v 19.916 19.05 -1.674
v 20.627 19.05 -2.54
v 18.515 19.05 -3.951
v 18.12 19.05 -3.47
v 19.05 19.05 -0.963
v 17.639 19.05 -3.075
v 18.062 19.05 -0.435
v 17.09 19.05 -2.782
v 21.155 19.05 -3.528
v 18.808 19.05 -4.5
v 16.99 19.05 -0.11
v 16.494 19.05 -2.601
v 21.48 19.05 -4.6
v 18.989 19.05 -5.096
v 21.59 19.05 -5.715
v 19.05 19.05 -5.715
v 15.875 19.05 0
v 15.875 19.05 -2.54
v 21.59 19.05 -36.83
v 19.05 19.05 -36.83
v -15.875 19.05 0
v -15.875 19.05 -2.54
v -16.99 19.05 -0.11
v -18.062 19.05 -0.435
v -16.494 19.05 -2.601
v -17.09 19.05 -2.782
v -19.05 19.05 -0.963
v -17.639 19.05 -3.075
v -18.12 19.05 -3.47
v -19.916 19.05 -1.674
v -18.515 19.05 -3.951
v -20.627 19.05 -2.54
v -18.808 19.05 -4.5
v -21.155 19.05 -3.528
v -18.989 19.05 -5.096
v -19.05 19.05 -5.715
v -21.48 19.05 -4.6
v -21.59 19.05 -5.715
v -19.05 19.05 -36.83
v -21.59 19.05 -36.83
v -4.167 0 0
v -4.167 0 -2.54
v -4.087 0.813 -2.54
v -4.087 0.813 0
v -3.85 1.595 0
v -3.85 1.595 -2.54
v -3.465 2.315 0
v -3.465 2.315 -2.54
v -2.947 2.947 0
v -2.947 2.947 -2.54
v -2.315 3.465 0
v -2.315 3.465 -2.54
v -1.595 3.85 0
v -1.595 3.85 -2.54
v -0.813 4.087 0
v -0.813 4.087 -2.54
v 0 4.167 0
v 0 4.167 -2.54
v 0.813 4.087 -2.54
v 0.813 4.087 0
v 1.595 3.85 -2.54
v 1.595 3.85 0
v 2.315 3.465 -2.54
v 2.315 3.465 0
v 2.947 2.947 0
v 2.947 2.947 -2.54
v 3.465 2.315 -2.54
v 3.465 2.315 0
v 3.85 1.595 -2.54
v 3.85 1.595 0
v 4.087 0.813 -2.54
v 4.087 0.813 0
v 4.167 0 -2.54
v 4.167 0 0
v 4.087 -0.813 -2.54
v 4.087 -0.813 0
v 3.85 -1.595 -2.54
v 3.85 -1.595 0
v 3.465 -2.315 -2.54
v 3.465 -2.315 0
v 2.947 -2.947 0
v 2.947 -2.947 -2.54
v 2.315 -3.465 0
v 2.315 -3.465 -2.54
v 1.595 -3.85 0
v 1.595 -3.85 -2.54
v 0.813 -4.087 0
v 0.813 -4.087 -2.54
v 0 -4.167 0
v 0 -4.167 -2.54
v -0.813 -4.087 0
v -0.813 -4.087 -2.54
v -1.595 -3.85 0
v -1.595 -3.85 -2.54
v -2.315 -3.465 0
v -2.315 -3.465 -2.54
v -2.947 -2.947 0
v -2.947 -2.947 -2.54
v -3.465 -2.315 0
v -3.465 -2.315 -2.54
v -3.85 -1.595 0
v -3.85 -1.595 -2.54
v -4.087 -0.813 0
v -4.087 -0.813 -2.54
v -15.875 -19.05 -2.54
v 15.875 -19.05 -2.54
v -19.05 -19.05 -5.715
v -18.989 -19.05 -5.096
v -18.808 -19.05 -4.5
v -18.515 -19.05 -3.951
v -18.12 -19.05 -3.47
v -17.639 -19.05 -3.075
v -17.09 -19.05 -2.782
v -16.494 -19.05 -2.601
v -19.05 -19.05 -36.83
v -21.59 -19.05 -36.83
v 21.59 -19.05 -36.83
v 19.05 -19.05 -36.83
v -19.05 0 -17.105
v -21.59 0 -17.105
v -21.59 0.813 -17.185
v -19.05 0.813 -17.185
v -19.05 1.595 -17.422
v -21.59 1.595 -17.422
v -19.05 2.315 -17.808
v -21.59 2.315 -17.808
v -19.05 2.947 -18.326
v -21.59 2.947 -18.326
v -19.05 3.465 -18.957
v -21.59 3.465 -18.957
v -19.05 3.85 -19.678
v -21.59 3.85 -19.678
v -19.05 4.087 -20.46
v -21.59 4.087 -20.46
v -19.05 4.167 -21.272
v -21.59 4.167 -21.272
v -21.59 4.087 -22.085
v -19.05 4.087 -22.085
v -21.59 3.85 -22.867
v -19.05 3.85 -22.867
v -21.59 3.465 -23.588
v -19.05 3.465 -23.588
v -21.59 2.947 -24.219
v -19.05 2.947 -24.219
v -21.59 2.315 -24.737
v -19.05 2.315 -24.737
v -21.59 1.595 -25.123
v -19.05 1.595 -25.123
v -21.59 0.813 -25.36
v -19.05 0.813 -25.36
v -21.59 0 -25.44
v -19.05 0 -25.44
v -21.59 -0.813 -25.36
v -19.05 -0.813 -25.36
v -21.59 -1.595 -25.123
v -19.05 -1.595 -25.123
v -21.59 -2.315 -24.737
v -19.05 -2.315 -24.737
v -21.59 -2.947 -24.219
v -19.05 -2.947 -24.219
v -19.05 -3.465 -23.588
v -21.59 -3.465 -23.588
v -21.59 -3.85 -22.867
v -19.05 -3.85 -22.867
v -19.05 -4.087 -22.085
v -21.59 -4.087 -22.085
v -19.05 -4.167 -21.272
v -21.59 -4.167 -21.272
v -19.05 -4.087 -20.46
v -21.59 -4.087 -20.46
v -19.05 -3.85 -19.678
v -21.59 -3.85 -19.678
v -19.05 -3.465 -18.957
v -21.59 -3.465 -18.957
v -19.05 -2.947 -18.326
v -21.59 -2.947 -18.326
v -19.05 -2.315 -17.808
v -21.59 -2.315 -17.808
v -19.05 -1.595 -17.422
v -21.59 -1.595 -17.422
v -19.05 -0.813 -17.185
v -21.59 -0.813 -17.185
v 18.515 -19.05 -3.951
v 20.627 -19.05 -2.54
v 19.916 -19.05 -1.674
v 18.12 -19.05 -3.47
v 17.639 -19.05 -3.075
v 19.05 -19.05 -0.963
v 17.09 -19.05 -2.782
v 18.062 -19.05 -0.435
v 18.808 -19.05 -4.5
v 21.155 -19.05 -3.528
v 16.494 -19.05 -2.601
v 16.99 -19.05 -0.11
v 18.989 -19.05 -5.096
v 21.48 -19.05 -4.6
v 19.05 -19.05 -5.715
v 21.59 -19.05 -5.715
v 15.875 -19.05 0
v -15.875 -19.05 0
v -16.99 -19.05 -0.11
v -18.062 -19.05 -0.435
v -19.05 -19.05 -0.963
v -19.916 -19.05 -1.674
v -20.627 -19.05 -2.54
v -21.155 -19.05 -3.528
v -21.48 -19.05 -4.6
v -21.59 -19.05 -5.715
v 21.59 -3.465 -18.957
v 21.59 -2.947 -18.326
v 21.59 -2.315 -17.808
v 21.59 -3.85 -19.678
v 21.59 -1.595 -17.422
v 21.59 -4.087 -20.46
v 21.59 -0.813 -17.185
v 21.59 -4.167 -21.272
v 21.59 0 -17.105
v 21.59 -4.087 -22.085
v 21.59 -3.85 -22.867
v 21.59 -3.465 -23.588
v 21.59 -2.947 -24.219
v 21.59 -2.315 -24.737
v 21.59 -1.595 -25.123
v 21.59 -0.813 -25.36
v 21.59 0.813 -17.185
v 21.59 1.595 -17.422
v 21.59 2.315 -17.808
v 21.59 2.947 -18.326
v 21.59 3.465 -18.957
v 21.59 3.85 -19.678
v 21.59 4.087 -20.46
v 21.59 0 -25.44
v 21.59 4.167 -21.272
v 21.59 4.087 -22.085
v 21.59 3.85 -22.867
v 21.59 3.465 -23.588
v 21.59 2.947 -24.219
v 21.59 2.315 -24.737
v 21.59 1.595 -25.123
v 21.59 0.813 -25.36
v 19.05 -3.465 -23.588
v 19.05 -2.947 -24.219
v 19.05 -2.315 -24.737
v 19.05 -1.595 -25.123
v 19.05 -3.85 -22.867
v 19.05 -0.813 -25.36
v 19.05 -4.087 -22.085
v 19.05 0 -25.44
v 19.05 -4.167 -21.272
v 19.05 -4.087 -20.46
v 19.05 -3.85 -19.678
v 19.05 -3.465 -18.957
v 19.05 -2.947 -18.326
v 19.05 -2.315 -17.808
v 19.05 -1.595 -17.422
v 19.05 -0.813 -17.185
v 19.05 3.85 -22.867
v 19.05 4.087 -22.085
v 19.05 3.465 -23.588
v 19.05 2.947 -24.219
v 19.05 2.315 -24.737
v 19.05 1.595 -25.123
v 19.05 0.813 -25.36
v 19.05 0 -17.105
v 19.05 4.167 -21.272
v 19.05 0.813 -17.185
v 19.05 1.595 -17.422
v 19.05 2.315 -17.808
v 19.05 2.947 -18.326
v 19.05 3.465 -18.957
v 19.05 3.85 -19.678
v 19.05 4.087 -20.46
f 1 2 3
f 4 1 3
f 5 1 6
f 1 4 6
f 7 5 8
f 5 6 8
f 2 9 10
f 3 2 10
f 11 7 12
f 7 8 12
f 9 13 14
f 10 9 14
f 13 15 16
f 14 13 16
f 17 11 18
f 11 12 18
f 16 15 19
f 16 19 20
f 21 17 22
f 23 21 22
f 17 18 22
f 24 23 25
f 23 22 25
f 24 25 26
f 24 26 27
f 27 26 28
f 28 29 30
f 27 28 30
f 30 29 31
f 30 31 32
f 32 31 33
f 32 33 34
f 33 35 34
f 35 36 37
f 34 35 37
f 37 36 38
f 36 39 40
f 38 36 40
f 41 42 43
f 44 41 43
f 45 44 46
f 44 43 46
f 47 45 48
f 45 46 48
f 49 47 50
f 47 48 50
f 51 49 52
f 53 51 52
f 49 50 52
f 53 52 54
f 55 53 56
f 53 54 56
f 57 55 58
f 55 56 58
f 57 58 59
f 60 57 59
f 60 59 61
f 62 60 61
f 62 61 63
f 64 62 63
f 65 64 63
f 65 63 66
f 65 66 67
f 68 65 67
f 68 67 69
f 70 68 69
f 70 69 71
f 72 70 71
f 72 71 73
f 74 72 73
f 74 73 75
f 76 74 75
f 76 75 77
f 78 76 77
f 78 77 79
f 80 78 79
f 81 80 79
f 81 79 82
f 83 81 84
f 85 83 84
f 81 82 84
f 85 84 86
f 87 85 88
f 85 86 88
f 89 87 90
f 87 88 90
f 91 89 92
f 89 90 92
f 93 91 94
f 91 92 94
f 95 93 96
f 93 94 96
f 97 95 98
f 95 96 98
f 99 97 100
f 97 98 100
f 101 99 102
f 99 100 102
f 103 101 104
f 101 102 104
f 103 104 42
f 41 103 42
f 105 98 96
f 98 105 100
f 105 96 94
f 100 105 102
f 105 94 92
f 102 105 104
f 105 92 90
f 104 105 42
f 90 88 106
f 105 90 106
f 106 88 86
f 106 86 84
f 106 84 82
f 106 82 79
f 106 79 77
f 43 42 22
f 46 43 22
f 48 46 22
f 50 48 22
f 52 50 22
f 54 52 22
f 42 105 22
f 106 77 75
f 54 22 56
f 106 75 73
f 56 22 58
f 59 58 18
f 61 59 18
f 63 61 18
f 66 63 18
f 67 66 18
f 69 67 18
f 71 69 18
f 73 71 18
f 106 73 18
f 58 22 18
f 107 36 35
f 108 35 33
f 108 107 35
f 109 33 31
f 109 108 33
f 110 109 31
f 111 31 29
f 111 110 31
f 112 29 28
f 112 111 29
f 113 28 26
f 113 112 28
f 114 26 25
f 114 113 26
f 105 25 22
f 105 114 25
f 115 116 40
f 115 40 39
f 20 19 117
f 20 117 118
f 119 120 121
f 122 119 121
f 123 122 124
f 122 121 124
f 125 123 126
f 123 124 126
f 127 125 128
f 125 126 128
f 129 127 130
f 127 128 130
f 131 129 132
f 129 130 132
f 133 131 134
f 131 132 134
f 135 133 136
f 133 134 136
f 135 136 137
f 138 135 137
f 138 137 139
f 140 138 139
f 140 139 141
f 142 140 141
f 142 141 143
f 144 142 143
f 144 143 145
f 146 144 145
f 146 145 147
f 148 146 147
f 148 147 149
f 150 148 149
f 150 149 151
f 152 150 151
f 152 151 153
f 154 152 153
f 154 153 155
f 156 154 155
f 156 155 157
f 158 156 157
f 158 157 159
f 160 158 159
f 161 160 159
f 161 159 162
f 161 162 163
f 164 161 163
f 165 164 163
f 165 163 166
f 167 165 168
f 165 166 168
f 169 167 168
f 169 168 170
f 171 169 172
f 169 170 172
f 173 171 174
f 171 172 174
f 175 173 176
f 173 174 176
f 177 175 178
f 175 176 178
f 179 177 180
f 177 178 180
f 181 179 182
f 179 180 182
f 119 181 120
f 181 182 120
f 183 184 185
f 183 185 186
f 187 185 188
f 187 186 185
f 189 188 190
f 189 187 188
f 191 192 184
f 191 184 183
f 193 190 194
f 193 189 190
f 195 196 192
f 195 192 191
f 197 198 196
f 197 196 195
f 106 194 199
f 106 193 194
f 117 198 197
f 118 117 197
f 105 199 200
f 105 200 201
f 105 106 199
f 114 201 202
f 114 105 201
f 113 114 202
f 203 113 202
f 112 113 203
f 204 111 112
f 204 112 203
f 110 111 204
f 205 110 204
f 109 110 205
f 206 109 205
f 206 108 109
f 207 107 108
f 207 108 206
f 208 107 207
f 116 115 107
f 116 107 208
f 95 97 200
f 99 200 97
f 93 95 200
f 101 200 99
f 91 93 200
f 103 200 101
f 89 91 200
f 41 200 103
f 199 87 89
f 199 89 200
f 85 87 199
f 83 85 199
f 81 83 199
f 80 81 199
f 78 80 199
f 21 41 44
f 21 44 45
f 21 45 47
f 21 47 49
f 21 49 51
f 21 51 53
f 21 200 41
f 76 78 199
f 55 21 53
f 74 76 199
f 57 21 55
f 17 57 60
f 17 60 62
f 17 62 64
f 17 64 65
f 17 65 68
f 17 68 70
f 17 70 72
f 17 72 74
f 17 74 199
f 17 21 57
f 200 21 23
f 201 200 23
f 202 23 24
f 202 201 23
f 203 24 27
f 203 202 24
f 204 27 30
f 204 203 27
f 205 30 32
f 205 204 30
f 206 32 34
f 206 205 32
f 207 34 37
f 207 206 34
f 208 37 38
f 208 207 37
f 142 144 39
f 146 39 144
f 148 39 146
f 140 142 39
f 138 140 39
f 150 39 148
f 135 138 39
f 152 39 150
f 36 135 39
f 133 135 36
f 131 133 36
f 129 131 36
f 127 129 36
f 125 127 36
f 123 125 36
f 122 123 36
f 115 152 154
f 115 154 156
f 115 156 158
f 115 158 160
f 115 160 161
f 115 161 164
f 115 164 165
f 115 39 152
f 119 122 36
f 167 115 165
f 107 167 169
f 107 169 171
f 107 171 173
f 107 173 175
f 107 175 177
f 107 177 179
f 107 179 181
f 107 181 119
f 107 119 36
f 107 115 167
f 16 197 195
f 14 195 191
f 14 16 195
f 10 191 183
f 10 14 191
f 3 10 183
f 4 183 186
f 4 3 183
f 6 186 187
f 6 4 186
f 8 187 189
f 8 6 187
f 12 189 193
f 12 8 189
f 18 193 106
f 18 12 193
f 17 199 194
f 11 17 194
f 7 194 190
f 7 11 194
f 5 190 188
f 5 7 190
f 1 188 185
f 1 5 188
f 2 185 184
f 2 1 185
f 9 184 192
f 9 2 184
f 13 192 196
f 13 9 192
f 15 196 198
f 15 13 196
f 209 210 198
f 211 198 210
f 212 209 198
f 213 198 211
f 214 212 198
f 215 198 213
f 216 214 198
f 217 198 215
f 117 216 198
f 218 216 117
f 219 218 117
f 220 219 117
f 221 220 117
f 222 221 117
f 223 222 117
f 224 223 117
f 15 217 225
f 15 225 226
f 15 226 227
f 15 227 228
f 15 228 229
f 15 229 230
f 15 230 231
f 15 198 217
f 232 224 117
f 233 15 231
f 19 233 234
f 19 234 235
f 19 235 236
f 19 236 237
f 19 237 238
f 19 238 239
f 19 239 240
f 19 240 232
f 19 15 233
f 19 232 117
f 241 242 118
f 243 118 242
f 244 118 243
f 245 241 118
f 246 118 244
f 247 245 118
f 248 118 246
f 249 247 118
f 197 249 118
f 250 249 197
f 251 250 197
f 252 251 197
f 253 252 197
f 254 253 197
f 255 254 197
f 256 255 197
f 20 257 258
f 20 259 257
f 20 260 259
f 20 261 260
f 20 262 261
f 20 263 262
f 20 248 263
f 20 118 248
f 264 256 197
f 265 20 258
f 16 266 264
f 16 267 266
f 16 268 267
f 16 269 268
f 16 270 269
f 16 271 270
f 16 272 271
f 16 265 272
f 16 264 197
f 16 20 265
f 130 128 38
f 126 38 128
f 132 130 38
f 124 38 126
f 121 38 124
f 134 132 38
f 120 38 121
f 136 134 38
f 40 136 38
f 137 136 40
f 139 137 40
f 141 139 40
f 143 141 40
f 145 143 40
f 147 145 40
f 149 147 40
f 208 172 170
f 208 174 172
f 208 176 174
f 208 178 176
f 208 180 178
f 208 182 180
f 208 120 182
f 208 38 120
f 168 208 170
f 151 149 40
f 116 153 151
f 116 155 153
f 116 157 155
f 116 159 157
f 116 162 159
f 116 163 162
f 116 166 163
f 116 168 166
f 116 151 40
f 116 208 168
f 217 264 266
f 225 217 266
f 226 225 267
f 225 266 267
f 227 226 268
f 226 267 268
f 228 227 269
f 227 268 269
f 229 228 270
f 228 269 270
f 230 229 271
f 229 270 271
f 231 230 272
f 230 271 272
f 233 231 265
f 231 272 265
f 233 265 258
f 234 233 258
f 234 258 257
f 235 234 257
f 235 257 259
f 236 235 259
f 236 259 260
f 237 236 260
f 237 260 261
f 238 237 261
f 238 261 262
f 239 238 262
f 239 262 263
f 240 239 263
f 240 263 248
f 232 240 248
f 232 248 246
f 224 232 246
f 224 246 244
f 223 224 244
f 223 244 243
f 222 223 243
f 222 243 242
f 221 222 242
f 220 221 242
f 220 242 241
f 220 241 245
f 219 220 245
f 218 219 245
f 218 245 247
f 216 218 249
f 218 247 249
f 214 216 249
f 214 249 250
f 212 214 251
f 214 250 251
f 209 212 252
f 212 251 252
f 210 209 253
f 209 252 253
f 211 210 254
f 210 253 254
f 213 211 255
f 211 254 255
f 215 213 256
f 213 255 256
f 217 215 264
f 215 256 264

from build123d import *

# Parameters (mm, degrees)
SKETCH2_W                            = 31.75
SKETCH2_H                            = 38.1
BASE_FLANGE1_DEPTH                   = 2.54
EDGE_FLANGE2_DEPTH                   = 38.1
EDGE_FLANGE2_BEND_DEPTH              = 38.1
F_21_64_0_32813_DIAMETER_HOLE1_D     = 8.334502
F_21_64_0_32813_DIAMETER_HOLE1_DEPTH = 25.4
F_21_64_0_32813_DIAMETER_HOLE1_TIP   = 2.503937016
F_21_64_0_32813_DIAMETER_HOLE2_D     = 8.334502


# Sheet-metal steps are written as plain solids
with BuildPart() as part:
    # Sketch2 → Base-Flange1 (new body)
    with BuildSketch(Plane.XY):
        Rectangle(SKETCH2_W, SKETCH2_H)
    extrude(amount=-BASE_FLANGE1_DEPTH)

    # Edge-Flange2 section (across the edge) → Edge-Flange2 (add)
    with BuildSketch(Plane(origin=(19.05, 19.05, -2.54), x_dir=(-1, 0, 0), z_dir=(0, -1, 0))):
        with BuildLine():
            Line((-2.54, 3.175), (-2.54, 34.29))
            Line((-2.54, 34.29), (0, 34.29))
            Line((0, 34.29), (0, 3.175))
            ThreePointArc((0, 3.175), (0.92993597, 0.92993597), (3.175, 0))
            Line((3.175, 0), (3.175, -2.54))
            ThreePointArc((3.175, -2.54), (-0.866115254, -0.866115254), (-2.54, 3.175))
        make_face()
    extrude(amount=EDGE_FLANGE2_DEPTH)

    # Edge-Flange2 section 2 (across the edge) → Edge-Flange2 bend (add)
    with BuildSketch(Plane(origin=(-19.05, -19.05, -2.54), x_dir=(1, 0, 0), z_dir=(0, 1, 0))):
        with BuildLine():
            Line((-2.54, 3.175), (-2.54, 34.29))
            Line((-2.54, 34.29), (0, 34.29))
            Line((0, 34.29), (0, 3.175))
            ThreePointArc((0, 3.175), (0.92993597, 0.92993597), (3.175, 0))
            Line((3.175, 0), (3.175, -2.54))
            ThreePointArc((3.175, -2.54), (-0.866115254, -0.866115254), (-2.54, 3.175))
        make_face()
    extrude(amount=EDGE_FLANGE2_BEND_DEPTH)

    # 21/64 (0.32813) Diameter Hole1
    with Locations(Plane.XY):
        with Locations((0, 0)):
            Hole(F_21_64_0_32813_DIAMETER_HOLE1_D / 2, depth=F_21_64_0_32813_DIAMETER_HOLE1_DEPTH)
            with Locations((0, 0, -(F_21_64_0_32813_DIAMETER_HOLE1_DEPTH + F_21_64_0_32813_DIAMETER_HOLE1_TIP / 2))):  # 118° drill point
                Cone(0, F_21_64_0_32813_DIAMETER_HOLE1_D / 2, F_21_64_0_32813_DIAMETER_HOLE1_TIP, mode=Mode.SUBTRACT)

    # 21/64 (0.32813) Diameter Hole2 (through all)
    with Locations(Plane(origin=(21.59, 0, 0), x_dir=(0, 0, -1), z_dir=(1, 0, 0))):
        with Locations((21.2725, 0)):
            Hole(F_21_64_0_32813_DIAMETER_HOLE2_D / 2)


solid = part.part
